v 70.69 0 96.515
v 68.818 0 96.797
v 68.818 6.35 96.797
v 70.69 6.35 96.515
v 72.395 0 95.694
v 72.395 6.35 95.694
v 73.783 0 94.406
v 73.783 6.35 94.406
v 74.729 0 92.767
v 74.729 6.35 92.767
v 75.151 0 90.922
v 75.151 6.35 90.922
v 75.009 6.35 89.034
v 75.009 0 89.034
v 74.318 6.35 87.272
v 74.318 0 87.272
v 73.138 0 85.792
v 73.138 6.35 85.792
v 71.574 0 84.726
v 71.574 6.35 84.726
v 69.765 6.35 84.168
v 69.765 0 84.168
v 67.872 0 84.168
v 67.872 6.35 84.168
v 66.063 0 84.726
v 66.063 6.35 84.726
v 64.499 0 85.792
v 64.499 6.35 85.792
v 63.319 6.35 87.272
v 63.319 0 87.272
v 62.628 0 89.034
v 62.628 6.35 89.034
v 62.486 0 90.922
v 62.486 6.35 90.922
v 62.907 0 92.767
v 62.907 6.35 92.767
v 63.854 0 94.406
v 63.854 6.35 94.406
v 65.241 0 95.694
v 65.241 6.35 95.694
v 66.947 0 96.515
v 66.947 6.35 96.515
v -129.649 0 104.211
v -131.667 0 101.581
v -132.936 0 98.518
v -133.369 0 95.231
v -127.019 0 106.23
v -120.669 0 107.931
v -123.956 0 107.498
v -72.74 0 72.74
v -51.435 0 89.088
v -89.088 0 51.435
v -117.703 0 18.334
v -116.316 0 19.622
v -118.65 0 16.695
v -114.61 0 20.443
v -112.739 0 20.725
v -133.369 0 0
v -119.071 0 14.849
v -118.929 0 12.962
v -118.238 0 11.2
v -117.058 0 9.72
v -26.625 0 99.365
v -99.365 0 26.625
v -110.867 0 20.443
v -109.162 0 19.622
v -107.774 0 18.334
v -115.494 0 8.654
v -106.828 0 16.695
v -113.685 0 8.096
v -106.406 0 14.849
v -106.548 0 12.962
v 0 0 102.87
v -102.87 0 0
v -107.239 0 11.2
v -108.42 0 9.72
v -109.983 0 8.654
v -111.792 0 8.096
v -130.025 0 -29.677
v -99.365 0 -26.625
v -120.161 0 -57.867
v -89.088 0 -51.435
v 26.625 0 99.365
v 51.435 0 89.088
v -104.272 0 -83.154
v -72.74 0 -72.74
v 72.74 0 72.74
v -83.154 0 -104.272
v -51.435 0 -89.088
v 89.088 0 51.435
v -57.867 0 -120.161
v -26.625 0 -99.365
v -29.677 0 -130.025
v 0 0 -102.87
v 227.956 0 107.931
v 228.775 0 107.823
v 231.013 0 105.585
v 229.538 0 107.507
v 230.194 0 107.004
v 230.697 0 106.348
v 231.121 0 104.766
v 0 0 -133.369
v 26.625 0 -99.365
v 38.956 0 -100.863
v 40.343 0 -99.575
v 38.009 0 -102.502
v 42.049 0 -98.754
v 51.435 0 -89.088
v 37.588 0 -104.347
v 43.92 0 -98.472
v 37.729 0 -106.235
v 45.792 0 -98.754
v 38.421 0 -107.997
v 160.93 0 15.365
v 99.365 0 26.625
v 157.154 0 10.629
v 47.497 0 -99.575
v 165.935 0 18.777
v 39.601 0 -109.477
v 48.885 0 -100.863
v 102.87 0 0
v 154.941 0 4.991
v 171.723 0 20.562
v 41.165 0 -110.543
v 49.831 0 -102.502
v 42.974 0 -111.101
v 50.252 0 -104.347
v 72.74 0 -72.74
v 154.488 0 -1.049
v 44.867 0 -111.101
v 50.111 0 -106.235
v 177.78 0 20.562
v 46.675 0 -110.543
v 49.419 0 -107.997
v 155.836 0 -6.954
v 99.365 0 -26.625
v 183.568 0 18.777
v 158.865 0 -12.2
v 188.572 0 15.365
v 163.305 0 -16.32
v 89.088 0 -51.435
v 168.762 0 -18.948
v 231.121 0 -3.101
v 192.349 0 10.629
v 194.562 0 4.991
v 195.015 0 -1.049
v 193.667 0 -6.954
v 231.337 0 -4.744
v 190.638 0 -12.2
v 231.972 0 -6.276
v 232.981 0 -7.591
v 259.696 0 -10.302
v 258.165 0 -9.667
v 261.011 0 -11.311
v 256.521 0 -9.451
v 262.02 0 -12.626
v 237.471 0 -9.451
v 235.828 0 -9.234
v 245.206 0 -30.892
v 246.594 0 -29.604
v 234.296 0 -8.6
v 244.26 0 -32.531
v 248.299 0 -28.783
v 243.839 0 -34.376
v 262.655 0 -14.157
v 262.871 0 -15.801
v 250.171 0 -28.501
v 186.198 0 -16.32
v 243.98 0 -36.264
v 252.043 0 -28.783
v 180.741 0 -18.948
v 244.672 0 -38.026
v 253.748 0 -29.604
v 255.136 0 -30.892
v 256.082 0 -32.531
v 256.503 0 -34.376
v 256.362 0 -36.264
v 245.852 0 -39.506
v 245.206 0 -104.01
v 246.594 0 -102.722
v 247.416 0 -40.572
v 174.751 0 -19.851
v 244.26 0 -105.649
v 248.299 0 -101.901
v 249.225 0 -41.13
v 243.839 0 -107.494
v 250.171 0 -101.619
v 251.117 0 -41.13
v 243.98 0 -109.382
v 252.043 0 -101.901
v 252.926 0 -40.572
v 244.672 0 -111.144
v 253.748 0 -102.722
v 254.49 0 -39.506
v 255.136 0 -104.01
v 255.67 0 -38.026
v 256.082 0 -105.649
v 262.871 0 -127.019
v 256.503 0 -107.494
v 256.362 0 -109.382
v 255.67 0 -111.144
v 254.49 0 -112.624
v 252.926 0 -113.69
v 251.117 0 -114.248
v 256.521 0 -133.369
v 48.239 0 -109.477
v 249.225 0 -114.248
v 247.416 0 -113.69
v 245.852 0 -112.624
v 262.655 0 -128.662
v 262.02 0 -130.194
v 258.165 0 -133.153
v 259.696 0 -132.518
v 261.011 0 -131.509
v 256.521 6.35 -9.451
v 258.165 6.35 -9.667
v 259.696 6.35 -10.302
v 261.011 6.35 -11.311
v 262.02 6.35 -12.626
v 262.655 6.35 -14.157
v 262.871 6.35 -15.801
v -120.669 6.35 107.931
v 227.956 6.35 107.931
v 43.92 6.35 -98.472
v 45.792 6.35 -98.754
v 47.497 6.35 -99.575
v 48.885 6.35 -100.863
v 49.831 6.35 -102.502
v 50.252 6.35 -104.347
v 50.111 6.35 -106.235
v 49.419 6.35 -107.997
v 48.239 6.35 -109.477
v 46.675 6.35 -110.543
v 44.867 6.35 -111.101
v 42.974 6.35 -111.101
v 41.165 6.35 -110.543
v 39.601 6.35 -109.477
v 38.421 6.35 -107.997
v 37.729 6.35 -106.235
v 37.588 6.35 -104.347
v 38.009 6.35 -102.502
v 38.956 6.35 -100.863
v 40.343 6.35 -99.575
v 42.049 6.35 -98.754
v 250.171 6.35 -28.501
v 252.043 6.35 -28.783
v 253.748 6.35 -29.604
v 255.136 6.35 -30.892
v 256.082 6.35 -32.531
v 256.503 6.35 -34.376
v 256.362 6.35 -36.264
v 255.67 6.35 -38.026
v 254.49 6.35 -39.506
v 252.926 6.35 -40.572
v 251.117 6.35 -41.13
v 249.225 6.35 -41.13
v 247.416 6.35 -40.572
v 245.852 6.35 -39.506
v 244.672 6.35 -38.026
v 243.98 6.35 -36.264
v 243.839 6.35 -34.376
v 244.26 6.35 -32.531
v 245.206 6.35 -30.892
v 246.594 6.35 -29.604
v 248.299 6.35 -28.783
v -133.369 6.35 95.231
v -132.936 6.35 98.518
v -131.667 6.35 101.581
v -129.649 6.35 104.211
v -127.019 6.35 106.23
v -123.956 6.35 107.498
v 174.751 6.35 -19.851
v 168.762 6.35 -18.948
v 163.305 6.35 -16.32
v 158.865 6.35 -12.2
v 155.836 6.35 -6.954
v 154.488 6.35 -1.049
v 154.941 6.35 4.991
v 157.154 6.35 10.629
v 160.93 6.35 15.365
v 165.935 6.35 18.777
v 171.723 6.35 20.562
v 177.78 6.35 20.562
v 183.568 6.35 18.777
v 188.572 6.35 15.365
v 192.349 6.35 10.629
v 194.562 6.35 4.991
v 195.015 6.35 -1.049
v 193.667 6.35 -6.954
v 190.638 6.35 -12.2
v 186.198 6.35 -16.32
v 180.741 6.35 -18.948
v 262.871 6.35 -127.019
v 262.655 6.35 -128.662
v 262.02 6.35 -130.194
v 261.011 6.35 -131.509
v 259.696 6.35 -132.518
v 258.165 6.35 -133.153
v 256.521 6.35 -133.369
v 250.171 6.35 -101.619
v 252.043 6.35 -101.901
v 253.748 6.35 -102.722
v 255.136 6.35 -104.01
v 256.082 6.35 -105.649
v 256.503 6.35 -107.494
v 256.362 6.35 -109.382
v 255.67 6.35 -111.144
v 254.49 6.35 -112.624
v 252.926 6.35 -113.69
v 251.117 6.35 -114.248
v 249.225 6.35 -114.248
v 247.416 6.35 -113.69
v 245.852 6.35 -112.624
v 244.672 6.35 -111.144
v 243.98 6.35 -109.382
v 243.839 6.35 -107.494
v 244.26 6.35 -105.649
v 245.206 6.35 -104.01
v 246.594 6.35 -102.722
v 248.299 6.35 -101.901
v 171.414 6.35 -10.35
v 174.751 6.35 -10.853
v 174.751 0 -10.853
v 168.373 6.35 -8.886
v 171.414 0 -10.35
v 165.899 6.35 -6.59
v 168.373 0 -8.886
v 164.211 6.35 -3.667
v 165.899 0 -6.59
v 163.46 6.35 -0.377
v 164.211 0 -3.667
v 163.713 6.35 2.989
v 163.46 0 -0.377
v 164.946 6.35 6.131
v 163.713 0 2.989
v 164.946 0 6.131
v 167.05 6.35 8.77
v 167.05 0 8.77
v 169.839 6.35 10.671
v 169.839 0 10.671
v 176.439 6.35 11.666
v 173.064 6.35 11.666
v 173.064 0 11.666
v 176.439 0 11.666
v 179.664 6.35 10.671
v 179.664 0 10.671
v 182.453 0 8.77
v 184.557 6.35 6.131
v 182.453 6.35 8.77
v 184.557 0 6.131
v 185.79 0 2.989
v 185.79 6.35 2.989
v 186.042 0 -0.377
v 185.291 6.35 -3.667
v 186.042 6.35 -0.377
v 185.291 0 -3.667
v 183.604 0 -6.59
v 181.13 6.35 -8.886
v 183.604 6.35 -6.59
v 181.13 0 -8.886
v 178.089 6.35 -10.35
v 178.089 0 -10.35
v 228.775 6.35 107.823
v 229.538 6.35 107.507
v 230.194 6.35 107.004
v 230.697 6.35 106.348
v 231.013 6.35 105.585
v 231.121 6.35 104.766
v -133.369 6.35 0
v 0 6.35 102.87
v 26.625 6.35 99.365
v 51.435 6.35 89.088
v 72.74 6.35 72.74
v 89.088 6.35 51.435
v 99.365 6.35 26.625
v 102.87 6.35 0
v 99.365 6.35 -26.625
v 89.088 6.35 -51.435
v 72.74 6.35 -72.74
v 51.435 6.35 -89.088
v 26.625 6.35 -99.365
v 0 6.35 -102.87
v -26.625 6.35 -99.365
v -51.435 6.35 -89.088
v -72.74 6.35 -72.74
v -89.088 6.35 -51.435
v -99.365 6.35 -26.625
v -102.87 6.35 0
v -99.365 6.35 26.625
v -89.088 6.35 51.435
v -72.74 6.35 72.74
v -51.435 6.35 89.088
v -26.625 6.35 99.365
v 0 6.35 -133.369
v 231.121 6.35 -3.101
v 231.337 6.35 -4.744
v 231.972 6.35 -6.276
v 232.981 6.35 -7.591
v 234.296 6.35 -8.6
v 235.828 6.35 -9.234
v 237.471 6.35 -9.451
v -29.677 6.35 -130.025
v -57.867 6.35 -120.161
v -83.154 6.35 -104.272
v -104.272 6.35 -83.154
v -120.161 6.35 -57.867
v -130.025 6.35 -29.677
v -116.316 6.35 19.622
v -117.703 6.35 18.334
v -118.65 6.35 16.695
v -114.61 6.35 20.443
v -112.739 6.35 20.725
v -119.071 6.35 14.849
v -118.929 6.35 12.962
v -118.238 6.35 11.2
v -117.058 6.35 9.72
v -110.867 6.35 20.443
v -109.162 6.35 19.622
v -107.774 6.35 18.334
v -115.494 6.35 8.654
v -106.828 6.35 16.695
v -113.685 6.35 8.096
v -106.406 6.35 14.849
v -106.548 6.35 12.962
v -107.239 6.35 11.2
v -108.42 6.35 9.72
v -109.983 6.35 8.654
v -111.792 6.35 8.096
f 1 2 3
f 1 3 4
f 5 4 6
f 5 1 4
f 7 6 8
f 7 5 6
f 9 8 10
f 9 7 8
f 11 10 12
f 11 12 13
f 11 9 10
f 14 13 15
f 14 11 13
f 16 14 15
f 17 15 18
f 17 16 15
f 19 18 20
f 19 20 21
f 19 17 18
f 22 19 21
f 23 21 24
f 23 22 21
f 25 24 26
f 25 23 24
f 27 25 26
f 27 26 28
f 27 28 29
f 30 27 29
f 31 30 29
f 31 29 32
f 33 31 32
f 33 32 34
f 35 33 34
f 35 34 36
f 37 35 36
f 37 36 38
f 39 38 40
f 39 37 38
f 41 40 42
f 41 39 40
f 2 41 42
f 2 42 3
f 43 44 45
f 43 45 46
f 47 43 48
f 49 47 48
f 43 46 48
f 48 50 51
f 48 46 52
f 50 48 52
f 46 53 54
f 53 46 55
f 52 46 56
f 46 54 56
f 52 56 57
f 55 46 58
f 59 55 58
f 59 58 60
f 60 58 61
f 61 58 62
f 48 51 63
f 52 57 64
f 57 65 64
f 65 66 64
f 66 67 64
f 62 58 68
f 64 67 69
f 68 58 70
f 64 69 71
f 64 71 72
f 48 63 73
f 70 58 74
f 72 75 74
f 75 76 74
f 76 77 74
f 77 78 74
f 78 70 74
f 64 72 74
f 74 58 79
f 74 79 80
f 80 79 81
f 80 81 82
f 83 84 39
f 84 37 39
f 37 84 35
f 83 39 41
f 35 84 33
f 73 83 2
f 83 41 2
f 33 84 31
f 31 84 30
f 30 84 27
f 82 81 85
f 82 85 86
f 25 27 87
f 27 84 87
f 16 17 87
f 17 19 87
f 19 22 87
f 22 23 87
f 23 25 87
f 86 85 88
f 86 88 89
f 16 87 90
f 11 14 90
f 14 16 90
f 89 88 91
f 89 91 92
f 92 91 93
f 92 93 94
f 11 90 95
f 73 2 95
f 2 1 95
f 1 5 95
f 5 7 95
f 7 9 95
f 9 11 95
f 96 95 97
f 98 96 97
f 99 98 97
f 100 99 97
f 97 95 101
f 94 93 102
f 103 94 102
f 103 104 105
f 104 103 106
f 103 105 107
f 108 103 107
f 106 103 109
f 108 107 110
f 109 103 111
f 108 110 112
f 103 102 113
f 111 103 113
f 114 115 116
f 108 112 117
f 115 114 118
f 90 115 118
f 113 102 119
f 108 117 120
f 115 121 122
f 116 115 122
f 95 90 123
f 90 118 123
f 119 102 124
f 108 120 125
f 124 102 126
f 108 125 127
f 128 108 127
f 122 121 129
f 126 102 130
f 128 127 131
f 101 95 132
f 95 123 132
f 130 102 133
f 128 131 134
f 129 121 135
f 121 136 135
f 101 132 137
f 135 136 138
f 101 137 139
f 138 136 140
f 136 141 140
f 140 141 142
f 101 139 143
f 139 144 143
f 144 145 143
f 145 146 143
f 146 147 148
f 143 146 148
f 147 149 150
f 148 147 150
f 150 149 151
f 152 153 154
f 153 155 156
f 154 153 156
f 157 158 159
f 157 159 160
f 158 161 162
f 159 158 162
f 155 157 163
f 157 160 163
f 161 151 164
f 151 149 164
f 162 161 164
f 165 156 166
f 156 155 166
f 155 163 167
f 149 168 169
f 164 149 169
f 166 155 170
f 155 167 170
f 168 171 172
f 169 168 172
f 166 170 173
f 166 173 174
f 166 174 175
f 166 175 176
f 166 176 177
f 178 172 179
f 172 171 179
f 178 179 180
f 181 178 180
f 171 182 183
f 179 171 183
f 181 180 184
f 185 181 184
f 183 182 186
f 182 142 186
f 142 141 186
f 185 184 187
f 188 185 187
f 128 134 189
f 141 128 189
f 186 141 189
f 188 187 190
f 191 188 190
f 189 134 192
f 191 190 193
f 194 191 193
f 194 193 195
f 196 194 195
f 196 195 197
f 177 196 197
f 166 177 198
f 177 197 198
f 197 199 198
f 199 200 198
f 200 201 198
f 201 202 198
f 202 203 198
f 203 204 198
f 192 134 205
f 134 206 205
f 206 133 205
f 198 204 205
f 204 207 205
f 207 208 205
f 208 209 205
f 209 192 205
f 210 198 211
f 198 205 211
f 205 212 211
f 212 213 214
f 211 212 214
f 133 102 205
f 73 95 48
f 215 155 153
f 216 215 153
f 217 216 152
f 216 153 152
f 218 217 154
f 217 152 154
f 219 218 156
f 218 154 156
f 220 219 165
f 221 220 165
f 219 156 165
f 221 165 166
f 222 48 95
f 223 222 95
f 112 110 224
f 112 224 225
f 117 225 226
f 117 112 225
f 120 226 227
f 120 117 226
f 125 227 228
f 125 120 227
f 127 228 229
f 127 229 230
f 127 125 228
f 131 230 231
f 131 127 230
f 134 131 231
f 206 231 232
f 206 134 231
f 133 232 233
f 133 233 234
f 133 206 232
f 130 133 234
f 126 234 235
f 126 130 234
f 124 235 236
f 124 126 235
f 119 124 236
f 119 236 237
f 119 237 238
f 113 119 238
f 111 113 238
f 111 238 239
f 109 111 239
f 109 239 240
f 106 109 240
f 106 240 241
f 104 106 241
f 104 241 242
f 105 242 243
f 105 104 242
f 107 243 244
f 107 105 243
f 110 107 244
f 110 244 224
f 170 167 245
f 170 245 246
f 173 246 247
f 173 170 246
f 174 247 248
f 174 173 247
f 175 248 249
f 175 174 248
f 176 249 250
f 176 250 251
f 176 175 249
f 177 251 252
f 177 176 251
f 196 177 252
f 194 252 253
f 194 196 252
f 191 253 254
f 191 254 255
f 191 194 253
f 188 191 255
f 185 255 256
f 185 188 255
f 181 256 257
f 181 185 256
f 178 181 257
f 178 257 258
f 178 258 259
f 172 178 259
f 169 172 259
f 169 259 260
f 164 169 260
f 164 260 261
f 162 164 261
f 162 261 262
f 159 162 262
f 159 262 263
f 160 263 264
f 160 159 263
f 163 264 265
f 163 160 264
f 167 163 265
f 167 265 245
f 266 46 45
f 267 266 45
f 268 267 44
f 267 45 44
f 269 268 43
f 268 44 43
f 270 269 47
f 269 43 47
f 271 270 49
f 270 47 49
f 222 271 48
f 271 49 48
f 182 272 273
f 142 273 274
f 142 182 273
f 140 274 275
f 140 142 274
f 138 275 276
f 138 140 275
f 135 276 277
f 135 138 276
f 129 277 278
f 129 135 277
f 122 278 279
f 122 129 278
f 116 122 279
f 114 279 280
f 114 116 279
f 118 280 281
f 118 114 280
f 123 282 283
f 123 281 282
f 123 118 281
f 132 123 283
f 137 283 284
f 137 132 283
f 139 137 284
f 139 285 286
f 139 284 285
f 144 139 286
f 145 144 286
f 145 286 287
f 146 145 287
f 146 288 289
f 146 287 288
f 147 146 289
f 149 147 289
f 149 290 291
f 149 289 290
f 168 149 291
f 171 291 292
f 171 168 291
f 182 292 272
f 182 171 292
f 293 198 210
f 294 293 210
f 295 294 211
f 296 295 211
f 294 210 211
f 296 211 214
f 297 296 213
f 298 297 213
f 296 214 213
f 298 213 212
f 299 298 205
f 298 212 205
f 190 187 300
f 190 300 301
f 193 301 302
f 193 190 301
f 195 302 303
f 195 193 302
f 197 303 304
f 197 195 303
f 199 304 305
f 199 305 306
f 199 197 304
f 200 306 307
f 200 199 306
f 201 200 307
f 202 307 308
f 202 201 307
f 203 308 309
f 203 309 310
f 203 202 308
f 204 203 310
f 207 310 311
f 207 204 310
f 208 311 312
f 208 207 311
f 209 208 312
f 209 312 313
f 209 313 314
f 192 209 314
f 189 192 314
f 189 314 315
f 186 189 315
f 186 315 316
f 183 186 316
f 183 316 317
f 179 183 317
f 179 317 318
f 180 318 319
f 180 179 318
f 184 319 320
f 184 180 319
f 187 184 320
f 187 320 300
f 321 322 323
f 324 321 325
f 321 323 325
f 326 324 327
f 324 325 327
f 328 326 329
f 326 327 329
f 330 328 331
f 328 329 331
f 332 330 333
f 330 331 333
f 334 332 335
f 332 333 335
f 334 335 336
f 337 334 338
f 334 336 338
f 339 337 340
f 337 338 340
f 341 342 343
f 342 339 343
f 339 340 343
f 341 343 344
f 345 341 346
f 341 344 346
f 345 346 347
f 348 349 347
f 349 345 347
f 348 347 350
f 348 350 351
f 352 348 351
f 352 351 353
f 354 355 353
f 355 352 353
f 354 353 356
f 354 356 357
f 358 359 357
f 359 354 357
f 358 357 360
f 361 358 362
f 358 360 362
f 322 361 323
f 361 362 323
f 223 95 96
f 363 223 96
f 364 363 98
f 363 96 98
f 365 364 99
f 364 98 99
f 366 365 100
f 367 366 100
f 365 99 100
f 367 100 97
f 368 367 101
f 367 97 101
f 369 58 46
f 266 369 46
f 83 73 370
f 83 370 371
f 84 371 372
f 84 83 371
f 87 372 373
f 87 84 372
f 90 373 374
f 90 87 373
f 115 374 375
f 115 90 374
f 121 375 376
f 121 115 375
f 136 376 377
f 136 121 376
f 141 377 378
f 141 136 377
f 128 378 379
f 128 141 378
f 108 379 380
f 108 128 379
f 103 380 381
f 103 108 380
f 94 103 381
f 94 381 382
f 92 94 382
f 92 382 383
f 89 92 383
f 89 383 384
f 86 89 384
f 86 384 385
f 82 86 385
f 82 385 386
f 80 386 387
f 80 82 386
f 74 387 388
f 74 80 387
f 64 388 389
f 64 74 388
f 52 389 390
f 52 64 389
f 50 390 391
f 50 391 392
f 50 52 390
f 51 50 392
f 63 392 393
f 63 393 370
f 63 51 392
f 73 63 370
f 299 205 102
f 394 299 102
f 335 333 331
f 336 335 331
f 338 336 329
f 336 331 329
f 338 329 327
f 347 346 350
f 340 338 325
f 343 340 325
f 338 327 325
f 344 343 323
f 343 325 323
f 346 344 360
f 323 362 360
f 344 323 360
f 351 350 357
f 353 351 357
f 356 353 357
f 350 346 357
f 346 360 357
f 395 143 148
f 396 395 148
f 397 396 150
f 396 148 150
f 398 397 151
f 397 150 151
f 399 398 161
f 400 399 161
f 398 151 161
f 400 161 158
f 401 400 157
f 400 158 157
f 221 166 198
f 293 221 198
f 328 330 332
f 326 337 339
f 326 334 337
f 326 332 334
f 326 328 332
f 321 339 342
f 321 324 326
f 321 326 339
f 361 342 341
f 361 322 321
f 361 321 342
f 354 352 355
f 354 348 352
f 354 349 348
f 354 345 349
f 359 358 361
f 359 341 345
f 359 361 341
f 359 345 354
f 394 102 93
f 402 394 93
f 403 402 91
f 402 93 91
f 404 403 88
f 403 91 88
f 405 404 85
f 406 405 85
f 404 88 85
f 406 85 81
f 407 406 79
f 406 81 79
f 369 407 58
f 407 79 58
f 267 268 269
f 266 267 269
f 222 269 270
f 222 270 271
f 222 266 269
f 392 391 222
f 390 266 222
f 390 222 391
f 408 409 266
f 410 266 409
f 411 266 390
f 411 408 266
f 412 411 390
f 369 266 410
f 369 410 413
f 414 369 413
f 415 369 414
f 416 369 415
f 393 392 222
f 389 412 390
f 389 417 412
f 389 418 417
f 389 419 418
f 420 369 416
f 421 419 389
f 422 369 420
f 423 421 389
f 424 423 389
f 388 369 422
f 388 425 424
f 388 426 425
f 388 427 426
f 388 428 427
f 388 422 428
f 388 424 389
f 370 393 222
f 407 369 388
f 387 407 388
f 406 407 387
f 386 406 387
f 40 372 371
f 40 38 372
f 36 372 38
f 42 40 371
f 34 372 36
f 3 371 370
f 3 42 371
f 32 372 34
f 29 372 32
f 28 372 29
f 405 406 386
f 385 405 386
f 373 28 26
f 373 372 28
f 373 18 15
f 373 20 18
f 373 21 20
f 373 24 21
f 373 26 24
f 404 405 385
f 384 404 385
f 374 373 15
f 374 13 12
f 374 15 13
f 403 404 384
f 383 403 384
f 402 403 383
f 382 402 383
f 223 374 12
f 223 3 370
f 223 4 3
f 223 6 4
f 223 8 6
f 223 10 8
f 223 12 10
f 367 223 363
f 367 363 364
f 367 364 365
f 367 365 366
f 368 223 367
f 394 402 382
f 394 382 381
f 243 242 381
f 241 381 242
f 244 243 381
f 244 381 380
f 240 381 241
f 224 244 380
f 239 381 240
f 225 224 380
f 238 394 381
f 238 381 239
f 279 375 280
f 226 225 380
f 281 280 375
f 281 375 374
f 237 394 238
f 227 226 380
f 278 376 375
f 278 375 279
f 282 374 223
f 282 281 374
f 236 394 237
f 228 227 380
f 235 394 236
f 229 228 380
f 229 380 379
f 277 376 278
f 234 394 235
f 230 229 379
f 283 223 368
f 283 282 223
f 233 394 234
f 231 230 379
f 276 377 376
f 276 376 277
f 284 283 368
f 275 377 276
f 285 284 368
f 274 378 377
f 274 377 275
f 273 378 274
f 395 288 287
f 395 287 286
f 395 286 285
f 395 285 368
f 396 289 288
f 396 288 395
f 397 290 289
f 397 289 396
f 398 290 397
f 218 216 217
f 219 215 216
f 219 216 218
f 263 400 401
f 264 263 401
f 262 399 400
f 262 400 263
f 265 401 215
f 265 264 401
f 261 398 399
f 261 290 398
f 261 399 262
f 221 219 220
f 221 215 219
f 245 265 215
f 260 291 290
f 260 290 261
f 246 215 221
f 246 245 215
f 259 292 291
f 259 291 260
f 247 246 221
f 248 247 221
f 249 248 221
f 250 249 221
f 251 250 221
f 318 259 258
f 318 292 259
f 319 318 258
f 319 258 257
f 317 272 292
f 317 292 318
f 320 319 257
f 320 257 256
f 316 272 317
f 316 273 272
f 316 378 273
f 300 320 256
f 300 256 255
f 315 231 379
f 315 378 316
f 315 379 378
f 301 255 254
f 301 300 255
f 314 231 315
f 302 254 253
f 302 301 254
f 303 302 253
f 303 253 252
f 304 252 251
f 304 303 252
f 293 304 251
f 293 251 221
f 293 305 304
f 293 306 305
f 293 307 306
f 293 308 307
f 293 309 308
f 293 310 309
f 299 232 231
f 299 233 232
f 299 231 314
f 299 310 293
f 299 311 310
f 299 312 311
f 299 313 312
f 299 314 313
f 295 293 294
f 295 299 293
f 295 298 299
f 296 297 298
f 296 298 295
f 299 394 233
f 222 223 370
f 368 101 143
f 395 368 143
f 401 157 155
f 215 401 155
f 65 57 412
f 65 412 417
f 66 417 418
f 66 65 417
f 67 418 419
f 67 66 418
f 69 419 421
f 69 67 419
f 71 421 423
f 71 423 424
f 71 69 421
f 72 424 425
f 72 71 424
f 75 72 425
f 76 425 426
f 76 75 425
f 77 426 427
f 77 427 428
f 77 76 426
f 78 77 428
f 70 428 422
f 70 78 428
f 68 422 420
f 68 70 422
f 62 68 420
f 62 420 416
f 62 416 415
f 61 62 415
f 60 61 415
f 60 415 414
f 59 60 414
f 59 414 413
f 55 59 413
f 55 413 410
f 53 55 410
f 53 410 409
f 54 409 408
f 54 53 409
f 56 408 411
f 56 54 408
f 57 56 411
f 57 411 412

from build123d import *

# Parameters (mm, degrees)
SKETCH1_R           = 102.87
SKETCH1_R_2         = 6.35
BOSS_EXTRUDE1_DEPTH = 6.35
SKETCH6_R           = 20.32
SKETCH6_R_2         = 11.322751343
CUT_EXTRUDE1_DEPTH  = 28.448


with BuildPart() as part:
    # Sketch1 → Boss-Extrude1 (new body)
    with BuildSketch(Plane(origin=(0, 0, 0), x_dir=(1, 0, 0), z_dir=(0, 1, 0))):
        with BuildLine():
            Line((256.521079071, 133.368920929), (0, 133.368920929))
            ThreePointArc((0, 133.368920929), (-94.306068389, 94.306068389), (-133.368920929, 0))
            Line((-133.368920929, 0), (-133.368920929, -95.231079071))
            ThreePointArc((-133.368920929, -95.231079071), (-129.64917705, -104.211335192), (-120.668920929, -107.931079071))
            Line((-120.668920929, -107.931079071), (227.955539535, -107.931079071))
            ThreePointArc((227.955539535, -107.931079071), (230.193914007, -107.003914007), (231.121079071, -104.765539535))
            Line((231.121079071, -104.765539535), (231.121079071, 3.100777109))
            ThreePointArc((231.121079071, 3.100777109), (232.98095101, 7.59090517), (237.471079071, 9.450777109))
            Line((237.471079071, 9.450777109), (256.521079071, 9.450777109))
            ThreePointArc((256.521079071, 9.450777109), (261.011207131, 11.310649048), (262.871079071, 15.800777109))
            Line((262.871079071, 15.800777109), (262.871079071, 127.018920929))
            ThreePointArc((262.871079071, 127.018920929), (261.011207131, 131.50904899), (256.521079071, 133.368920929))
        make_face()
        with Locations(Location((0, 0, 0), (0, 0, 270))):
            Circle(SKETCH1_R, mode=Mode.SUBTRACT)
        with Locations(Location((-112.738641363, -14.374963544, 0), (0, 0, 270))):
            Circle(SKETCH1_R_2, mode=Mode.SUBTRACT)
        with Locations(Location((43.920237074, 104.822009181, 0), (0, 0, 270))):
            Circle(SKETCH1_R_2, mode=Mode.SUBTRACT)
        with Locations(Location((68.818404289, -90.447045637, 0), (0, 0, 270))):
            Circle(SKETCH1_R_2, mode=Mode.SUBTRACT)
        with Locations(Location((250.171079071, 107.968920929, 0), (0, 0, 270))):
            Circle(SKETCH1_R_2, mode=Mode.SUBTRACT)
        with Locations(Location((250.171079071, 34.850777109, 0), (0, 0, 270))):
            Circle(SKETCH1_R_2, mode=Mode.SUBTRACT)
    extrude(amount=BOSS_EXTRUDE1_DEPTH)

    # Sketch6 → Cut-Extrude1 (cut)
    with BuildSketch(Plane(origin=(0, 0, 0), x_dir=(1, 0, 0), z_dir=(0, 1, 0))):
        with Locations(Location((174.751369453, -0.469444786, 0), (0, 0, 90))):
            Circle(SKETCH6_R)
        with Locations(Location((174.751369453, -0.469444786, 0), (0, 0, 90))):
            Circle(SKETCH6_R_2, mode=Mode.SUBTRACT)
    extrude(amount=CUT_EXTRUDE1_DEPTH, mode=Mode.SUBTRACT)


with BuildPart() as cut_extrude1_piece_1:
    # of the separate pieces the step leaves, piece 1, a body of its own (cut_extrude1_pieces)
    add(part.part.solids().sort_by_distance((256.521079071, 0, -9.450777109))[0])


with BuildPart() as cut_extrude1_piece_2:
    # of the separate pieces the step leaves, piece 2, a body of its own (cut_extrude1_pieces)
    add(part.part.solids().sort_by_distance((174.751369453, 0, -10.853306558))[0])


solid = Compound([cut_extrude1_piece_1.part, cut_extrude1_piece_2.part])
